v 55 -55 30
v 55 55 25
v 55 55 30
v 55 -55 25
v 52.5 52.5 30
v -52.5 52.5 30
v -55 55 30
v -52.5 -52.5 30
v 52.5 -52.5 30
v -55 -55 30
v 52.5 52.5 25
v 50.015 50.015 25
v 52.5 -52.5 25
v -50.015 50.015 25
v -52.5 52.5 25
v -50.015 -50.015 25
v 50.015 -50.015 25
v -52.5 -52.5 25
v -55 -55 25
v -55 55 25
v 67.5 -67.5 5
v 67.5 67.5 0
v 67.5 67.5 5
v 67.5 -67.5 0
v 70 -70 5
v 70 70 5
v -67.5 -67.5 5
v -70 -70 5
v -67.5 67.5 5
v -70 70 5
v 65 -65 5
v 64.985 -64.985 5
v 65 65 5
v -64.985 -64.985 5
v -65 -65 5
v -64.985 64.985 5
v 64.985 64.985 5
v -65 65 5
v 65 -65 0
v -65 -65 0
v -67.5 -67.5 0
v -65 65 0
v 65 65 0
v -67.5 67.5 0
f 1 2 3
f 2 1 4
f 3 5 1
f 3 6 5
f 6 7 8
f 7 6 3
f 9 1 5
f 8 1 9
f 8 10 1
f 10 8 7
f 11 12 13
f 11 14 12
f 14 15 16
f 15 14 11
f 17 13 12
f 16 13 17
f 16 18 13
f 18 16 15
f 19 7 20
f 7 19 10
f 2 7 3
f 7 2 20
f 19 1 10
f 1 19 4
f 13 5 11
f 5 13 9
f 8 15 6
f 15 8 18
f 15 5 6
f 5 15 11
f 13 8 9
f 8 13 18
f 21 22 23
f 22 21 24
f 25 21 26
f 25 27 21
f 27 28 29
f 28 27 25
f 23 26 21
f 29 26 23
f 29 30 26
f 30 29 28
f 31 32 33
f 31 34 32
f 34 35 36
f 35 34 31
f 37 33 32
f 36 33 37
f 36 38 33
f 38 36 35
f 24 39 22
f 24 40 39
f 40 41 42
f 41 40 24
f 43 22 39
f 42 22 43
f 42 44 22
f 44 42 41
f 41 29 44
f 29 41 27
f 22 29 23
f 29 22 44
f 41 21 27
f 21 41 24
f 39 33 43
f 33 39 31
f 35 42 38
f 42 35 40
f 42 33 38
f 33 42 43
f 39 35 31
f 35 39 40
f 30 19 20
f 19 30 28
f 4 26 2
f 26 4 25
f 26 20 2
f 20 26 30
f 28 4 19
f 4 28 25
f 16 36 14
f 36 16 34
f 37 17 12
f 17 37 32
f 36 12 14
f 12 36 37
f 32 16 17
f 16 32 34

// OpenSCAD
petri_diameter = 80;  // Диаметр чашки Петри

border_width = 30;      // Двойная ширина кольца освещения в проекции на землю
border_height = 20;     // высота кольца

box_width = 130;      // Внутренняя ширина коробки
box_height = 60;      // Внутренняя высота коробки
wall_thickness = 5;   // Толшина стенки
bottom_thickness = 5; // Толнина дна

slot_height = 5;            // Ширина паза для установки трубы 
slot_width = slot_height/2; // Толшина паза для установки трубы

doorslot_width = 5;       // Толшина паза для установки шторки
doorslot_depth = 2.1;     // Ширина паза для установки шторки
doorslot_thickness = 4;   // Толшина выступа для монтажа шторки
door_width = 100;         // ширина отверстия двери
door_height = box_height; // высота отверстия двери
eps = 0.02;


// Модуль пустотелой усеченной пирамиды
module lighting_ring() {
    // Проверка на корректность размеров (комментарий)
    // assert(a_bot > 2*t && a_top > 2*t);
    bot_out_width = box_width+2*wall_thickness;
    bot_in_width = box_width;
    top_out_width = bot_out_width-border_width;
    top_in_width = bot_in_width-border_width;
    
    // Верхний коннектор
    translate([0,0,border_height+slot_height*3/2])
    difference(){
        cube([top_out_width, top_out_width, slot_height],center=true);
        cube([top_in_width+2*slot_width, top_in_width+2*slot_width, slot_height+eps],center=true);
    }
    // Нижний коннектор
    translate([0,0,slot_height/2])
    difference(){
    cube([bot_in_width+2*slot_width, bot_in_width+2*slot_width, slot_height],center=true);
    cube([bot_in_width, bot_in_width, slot_height+eps],center=true);
    }
    translate([0,0,slot_height])
    difference() {
        // Внешняя усеченная пирамида
        linear_extrude(height=border_height, center=false, scale=top_out_width/bot_out_width)
            square([bot_out_width, bot_out_width], center=true);
        // Внутренняя усеченная пирамида
        translate([0,0,-eps])
        linear_extrude(height=border_height+2*eps, center=false, scale=top_in_width/ bot_in_width)
                square([bot_in_width, bot_in_width], center=true);
    }
}
lighting_ring();
